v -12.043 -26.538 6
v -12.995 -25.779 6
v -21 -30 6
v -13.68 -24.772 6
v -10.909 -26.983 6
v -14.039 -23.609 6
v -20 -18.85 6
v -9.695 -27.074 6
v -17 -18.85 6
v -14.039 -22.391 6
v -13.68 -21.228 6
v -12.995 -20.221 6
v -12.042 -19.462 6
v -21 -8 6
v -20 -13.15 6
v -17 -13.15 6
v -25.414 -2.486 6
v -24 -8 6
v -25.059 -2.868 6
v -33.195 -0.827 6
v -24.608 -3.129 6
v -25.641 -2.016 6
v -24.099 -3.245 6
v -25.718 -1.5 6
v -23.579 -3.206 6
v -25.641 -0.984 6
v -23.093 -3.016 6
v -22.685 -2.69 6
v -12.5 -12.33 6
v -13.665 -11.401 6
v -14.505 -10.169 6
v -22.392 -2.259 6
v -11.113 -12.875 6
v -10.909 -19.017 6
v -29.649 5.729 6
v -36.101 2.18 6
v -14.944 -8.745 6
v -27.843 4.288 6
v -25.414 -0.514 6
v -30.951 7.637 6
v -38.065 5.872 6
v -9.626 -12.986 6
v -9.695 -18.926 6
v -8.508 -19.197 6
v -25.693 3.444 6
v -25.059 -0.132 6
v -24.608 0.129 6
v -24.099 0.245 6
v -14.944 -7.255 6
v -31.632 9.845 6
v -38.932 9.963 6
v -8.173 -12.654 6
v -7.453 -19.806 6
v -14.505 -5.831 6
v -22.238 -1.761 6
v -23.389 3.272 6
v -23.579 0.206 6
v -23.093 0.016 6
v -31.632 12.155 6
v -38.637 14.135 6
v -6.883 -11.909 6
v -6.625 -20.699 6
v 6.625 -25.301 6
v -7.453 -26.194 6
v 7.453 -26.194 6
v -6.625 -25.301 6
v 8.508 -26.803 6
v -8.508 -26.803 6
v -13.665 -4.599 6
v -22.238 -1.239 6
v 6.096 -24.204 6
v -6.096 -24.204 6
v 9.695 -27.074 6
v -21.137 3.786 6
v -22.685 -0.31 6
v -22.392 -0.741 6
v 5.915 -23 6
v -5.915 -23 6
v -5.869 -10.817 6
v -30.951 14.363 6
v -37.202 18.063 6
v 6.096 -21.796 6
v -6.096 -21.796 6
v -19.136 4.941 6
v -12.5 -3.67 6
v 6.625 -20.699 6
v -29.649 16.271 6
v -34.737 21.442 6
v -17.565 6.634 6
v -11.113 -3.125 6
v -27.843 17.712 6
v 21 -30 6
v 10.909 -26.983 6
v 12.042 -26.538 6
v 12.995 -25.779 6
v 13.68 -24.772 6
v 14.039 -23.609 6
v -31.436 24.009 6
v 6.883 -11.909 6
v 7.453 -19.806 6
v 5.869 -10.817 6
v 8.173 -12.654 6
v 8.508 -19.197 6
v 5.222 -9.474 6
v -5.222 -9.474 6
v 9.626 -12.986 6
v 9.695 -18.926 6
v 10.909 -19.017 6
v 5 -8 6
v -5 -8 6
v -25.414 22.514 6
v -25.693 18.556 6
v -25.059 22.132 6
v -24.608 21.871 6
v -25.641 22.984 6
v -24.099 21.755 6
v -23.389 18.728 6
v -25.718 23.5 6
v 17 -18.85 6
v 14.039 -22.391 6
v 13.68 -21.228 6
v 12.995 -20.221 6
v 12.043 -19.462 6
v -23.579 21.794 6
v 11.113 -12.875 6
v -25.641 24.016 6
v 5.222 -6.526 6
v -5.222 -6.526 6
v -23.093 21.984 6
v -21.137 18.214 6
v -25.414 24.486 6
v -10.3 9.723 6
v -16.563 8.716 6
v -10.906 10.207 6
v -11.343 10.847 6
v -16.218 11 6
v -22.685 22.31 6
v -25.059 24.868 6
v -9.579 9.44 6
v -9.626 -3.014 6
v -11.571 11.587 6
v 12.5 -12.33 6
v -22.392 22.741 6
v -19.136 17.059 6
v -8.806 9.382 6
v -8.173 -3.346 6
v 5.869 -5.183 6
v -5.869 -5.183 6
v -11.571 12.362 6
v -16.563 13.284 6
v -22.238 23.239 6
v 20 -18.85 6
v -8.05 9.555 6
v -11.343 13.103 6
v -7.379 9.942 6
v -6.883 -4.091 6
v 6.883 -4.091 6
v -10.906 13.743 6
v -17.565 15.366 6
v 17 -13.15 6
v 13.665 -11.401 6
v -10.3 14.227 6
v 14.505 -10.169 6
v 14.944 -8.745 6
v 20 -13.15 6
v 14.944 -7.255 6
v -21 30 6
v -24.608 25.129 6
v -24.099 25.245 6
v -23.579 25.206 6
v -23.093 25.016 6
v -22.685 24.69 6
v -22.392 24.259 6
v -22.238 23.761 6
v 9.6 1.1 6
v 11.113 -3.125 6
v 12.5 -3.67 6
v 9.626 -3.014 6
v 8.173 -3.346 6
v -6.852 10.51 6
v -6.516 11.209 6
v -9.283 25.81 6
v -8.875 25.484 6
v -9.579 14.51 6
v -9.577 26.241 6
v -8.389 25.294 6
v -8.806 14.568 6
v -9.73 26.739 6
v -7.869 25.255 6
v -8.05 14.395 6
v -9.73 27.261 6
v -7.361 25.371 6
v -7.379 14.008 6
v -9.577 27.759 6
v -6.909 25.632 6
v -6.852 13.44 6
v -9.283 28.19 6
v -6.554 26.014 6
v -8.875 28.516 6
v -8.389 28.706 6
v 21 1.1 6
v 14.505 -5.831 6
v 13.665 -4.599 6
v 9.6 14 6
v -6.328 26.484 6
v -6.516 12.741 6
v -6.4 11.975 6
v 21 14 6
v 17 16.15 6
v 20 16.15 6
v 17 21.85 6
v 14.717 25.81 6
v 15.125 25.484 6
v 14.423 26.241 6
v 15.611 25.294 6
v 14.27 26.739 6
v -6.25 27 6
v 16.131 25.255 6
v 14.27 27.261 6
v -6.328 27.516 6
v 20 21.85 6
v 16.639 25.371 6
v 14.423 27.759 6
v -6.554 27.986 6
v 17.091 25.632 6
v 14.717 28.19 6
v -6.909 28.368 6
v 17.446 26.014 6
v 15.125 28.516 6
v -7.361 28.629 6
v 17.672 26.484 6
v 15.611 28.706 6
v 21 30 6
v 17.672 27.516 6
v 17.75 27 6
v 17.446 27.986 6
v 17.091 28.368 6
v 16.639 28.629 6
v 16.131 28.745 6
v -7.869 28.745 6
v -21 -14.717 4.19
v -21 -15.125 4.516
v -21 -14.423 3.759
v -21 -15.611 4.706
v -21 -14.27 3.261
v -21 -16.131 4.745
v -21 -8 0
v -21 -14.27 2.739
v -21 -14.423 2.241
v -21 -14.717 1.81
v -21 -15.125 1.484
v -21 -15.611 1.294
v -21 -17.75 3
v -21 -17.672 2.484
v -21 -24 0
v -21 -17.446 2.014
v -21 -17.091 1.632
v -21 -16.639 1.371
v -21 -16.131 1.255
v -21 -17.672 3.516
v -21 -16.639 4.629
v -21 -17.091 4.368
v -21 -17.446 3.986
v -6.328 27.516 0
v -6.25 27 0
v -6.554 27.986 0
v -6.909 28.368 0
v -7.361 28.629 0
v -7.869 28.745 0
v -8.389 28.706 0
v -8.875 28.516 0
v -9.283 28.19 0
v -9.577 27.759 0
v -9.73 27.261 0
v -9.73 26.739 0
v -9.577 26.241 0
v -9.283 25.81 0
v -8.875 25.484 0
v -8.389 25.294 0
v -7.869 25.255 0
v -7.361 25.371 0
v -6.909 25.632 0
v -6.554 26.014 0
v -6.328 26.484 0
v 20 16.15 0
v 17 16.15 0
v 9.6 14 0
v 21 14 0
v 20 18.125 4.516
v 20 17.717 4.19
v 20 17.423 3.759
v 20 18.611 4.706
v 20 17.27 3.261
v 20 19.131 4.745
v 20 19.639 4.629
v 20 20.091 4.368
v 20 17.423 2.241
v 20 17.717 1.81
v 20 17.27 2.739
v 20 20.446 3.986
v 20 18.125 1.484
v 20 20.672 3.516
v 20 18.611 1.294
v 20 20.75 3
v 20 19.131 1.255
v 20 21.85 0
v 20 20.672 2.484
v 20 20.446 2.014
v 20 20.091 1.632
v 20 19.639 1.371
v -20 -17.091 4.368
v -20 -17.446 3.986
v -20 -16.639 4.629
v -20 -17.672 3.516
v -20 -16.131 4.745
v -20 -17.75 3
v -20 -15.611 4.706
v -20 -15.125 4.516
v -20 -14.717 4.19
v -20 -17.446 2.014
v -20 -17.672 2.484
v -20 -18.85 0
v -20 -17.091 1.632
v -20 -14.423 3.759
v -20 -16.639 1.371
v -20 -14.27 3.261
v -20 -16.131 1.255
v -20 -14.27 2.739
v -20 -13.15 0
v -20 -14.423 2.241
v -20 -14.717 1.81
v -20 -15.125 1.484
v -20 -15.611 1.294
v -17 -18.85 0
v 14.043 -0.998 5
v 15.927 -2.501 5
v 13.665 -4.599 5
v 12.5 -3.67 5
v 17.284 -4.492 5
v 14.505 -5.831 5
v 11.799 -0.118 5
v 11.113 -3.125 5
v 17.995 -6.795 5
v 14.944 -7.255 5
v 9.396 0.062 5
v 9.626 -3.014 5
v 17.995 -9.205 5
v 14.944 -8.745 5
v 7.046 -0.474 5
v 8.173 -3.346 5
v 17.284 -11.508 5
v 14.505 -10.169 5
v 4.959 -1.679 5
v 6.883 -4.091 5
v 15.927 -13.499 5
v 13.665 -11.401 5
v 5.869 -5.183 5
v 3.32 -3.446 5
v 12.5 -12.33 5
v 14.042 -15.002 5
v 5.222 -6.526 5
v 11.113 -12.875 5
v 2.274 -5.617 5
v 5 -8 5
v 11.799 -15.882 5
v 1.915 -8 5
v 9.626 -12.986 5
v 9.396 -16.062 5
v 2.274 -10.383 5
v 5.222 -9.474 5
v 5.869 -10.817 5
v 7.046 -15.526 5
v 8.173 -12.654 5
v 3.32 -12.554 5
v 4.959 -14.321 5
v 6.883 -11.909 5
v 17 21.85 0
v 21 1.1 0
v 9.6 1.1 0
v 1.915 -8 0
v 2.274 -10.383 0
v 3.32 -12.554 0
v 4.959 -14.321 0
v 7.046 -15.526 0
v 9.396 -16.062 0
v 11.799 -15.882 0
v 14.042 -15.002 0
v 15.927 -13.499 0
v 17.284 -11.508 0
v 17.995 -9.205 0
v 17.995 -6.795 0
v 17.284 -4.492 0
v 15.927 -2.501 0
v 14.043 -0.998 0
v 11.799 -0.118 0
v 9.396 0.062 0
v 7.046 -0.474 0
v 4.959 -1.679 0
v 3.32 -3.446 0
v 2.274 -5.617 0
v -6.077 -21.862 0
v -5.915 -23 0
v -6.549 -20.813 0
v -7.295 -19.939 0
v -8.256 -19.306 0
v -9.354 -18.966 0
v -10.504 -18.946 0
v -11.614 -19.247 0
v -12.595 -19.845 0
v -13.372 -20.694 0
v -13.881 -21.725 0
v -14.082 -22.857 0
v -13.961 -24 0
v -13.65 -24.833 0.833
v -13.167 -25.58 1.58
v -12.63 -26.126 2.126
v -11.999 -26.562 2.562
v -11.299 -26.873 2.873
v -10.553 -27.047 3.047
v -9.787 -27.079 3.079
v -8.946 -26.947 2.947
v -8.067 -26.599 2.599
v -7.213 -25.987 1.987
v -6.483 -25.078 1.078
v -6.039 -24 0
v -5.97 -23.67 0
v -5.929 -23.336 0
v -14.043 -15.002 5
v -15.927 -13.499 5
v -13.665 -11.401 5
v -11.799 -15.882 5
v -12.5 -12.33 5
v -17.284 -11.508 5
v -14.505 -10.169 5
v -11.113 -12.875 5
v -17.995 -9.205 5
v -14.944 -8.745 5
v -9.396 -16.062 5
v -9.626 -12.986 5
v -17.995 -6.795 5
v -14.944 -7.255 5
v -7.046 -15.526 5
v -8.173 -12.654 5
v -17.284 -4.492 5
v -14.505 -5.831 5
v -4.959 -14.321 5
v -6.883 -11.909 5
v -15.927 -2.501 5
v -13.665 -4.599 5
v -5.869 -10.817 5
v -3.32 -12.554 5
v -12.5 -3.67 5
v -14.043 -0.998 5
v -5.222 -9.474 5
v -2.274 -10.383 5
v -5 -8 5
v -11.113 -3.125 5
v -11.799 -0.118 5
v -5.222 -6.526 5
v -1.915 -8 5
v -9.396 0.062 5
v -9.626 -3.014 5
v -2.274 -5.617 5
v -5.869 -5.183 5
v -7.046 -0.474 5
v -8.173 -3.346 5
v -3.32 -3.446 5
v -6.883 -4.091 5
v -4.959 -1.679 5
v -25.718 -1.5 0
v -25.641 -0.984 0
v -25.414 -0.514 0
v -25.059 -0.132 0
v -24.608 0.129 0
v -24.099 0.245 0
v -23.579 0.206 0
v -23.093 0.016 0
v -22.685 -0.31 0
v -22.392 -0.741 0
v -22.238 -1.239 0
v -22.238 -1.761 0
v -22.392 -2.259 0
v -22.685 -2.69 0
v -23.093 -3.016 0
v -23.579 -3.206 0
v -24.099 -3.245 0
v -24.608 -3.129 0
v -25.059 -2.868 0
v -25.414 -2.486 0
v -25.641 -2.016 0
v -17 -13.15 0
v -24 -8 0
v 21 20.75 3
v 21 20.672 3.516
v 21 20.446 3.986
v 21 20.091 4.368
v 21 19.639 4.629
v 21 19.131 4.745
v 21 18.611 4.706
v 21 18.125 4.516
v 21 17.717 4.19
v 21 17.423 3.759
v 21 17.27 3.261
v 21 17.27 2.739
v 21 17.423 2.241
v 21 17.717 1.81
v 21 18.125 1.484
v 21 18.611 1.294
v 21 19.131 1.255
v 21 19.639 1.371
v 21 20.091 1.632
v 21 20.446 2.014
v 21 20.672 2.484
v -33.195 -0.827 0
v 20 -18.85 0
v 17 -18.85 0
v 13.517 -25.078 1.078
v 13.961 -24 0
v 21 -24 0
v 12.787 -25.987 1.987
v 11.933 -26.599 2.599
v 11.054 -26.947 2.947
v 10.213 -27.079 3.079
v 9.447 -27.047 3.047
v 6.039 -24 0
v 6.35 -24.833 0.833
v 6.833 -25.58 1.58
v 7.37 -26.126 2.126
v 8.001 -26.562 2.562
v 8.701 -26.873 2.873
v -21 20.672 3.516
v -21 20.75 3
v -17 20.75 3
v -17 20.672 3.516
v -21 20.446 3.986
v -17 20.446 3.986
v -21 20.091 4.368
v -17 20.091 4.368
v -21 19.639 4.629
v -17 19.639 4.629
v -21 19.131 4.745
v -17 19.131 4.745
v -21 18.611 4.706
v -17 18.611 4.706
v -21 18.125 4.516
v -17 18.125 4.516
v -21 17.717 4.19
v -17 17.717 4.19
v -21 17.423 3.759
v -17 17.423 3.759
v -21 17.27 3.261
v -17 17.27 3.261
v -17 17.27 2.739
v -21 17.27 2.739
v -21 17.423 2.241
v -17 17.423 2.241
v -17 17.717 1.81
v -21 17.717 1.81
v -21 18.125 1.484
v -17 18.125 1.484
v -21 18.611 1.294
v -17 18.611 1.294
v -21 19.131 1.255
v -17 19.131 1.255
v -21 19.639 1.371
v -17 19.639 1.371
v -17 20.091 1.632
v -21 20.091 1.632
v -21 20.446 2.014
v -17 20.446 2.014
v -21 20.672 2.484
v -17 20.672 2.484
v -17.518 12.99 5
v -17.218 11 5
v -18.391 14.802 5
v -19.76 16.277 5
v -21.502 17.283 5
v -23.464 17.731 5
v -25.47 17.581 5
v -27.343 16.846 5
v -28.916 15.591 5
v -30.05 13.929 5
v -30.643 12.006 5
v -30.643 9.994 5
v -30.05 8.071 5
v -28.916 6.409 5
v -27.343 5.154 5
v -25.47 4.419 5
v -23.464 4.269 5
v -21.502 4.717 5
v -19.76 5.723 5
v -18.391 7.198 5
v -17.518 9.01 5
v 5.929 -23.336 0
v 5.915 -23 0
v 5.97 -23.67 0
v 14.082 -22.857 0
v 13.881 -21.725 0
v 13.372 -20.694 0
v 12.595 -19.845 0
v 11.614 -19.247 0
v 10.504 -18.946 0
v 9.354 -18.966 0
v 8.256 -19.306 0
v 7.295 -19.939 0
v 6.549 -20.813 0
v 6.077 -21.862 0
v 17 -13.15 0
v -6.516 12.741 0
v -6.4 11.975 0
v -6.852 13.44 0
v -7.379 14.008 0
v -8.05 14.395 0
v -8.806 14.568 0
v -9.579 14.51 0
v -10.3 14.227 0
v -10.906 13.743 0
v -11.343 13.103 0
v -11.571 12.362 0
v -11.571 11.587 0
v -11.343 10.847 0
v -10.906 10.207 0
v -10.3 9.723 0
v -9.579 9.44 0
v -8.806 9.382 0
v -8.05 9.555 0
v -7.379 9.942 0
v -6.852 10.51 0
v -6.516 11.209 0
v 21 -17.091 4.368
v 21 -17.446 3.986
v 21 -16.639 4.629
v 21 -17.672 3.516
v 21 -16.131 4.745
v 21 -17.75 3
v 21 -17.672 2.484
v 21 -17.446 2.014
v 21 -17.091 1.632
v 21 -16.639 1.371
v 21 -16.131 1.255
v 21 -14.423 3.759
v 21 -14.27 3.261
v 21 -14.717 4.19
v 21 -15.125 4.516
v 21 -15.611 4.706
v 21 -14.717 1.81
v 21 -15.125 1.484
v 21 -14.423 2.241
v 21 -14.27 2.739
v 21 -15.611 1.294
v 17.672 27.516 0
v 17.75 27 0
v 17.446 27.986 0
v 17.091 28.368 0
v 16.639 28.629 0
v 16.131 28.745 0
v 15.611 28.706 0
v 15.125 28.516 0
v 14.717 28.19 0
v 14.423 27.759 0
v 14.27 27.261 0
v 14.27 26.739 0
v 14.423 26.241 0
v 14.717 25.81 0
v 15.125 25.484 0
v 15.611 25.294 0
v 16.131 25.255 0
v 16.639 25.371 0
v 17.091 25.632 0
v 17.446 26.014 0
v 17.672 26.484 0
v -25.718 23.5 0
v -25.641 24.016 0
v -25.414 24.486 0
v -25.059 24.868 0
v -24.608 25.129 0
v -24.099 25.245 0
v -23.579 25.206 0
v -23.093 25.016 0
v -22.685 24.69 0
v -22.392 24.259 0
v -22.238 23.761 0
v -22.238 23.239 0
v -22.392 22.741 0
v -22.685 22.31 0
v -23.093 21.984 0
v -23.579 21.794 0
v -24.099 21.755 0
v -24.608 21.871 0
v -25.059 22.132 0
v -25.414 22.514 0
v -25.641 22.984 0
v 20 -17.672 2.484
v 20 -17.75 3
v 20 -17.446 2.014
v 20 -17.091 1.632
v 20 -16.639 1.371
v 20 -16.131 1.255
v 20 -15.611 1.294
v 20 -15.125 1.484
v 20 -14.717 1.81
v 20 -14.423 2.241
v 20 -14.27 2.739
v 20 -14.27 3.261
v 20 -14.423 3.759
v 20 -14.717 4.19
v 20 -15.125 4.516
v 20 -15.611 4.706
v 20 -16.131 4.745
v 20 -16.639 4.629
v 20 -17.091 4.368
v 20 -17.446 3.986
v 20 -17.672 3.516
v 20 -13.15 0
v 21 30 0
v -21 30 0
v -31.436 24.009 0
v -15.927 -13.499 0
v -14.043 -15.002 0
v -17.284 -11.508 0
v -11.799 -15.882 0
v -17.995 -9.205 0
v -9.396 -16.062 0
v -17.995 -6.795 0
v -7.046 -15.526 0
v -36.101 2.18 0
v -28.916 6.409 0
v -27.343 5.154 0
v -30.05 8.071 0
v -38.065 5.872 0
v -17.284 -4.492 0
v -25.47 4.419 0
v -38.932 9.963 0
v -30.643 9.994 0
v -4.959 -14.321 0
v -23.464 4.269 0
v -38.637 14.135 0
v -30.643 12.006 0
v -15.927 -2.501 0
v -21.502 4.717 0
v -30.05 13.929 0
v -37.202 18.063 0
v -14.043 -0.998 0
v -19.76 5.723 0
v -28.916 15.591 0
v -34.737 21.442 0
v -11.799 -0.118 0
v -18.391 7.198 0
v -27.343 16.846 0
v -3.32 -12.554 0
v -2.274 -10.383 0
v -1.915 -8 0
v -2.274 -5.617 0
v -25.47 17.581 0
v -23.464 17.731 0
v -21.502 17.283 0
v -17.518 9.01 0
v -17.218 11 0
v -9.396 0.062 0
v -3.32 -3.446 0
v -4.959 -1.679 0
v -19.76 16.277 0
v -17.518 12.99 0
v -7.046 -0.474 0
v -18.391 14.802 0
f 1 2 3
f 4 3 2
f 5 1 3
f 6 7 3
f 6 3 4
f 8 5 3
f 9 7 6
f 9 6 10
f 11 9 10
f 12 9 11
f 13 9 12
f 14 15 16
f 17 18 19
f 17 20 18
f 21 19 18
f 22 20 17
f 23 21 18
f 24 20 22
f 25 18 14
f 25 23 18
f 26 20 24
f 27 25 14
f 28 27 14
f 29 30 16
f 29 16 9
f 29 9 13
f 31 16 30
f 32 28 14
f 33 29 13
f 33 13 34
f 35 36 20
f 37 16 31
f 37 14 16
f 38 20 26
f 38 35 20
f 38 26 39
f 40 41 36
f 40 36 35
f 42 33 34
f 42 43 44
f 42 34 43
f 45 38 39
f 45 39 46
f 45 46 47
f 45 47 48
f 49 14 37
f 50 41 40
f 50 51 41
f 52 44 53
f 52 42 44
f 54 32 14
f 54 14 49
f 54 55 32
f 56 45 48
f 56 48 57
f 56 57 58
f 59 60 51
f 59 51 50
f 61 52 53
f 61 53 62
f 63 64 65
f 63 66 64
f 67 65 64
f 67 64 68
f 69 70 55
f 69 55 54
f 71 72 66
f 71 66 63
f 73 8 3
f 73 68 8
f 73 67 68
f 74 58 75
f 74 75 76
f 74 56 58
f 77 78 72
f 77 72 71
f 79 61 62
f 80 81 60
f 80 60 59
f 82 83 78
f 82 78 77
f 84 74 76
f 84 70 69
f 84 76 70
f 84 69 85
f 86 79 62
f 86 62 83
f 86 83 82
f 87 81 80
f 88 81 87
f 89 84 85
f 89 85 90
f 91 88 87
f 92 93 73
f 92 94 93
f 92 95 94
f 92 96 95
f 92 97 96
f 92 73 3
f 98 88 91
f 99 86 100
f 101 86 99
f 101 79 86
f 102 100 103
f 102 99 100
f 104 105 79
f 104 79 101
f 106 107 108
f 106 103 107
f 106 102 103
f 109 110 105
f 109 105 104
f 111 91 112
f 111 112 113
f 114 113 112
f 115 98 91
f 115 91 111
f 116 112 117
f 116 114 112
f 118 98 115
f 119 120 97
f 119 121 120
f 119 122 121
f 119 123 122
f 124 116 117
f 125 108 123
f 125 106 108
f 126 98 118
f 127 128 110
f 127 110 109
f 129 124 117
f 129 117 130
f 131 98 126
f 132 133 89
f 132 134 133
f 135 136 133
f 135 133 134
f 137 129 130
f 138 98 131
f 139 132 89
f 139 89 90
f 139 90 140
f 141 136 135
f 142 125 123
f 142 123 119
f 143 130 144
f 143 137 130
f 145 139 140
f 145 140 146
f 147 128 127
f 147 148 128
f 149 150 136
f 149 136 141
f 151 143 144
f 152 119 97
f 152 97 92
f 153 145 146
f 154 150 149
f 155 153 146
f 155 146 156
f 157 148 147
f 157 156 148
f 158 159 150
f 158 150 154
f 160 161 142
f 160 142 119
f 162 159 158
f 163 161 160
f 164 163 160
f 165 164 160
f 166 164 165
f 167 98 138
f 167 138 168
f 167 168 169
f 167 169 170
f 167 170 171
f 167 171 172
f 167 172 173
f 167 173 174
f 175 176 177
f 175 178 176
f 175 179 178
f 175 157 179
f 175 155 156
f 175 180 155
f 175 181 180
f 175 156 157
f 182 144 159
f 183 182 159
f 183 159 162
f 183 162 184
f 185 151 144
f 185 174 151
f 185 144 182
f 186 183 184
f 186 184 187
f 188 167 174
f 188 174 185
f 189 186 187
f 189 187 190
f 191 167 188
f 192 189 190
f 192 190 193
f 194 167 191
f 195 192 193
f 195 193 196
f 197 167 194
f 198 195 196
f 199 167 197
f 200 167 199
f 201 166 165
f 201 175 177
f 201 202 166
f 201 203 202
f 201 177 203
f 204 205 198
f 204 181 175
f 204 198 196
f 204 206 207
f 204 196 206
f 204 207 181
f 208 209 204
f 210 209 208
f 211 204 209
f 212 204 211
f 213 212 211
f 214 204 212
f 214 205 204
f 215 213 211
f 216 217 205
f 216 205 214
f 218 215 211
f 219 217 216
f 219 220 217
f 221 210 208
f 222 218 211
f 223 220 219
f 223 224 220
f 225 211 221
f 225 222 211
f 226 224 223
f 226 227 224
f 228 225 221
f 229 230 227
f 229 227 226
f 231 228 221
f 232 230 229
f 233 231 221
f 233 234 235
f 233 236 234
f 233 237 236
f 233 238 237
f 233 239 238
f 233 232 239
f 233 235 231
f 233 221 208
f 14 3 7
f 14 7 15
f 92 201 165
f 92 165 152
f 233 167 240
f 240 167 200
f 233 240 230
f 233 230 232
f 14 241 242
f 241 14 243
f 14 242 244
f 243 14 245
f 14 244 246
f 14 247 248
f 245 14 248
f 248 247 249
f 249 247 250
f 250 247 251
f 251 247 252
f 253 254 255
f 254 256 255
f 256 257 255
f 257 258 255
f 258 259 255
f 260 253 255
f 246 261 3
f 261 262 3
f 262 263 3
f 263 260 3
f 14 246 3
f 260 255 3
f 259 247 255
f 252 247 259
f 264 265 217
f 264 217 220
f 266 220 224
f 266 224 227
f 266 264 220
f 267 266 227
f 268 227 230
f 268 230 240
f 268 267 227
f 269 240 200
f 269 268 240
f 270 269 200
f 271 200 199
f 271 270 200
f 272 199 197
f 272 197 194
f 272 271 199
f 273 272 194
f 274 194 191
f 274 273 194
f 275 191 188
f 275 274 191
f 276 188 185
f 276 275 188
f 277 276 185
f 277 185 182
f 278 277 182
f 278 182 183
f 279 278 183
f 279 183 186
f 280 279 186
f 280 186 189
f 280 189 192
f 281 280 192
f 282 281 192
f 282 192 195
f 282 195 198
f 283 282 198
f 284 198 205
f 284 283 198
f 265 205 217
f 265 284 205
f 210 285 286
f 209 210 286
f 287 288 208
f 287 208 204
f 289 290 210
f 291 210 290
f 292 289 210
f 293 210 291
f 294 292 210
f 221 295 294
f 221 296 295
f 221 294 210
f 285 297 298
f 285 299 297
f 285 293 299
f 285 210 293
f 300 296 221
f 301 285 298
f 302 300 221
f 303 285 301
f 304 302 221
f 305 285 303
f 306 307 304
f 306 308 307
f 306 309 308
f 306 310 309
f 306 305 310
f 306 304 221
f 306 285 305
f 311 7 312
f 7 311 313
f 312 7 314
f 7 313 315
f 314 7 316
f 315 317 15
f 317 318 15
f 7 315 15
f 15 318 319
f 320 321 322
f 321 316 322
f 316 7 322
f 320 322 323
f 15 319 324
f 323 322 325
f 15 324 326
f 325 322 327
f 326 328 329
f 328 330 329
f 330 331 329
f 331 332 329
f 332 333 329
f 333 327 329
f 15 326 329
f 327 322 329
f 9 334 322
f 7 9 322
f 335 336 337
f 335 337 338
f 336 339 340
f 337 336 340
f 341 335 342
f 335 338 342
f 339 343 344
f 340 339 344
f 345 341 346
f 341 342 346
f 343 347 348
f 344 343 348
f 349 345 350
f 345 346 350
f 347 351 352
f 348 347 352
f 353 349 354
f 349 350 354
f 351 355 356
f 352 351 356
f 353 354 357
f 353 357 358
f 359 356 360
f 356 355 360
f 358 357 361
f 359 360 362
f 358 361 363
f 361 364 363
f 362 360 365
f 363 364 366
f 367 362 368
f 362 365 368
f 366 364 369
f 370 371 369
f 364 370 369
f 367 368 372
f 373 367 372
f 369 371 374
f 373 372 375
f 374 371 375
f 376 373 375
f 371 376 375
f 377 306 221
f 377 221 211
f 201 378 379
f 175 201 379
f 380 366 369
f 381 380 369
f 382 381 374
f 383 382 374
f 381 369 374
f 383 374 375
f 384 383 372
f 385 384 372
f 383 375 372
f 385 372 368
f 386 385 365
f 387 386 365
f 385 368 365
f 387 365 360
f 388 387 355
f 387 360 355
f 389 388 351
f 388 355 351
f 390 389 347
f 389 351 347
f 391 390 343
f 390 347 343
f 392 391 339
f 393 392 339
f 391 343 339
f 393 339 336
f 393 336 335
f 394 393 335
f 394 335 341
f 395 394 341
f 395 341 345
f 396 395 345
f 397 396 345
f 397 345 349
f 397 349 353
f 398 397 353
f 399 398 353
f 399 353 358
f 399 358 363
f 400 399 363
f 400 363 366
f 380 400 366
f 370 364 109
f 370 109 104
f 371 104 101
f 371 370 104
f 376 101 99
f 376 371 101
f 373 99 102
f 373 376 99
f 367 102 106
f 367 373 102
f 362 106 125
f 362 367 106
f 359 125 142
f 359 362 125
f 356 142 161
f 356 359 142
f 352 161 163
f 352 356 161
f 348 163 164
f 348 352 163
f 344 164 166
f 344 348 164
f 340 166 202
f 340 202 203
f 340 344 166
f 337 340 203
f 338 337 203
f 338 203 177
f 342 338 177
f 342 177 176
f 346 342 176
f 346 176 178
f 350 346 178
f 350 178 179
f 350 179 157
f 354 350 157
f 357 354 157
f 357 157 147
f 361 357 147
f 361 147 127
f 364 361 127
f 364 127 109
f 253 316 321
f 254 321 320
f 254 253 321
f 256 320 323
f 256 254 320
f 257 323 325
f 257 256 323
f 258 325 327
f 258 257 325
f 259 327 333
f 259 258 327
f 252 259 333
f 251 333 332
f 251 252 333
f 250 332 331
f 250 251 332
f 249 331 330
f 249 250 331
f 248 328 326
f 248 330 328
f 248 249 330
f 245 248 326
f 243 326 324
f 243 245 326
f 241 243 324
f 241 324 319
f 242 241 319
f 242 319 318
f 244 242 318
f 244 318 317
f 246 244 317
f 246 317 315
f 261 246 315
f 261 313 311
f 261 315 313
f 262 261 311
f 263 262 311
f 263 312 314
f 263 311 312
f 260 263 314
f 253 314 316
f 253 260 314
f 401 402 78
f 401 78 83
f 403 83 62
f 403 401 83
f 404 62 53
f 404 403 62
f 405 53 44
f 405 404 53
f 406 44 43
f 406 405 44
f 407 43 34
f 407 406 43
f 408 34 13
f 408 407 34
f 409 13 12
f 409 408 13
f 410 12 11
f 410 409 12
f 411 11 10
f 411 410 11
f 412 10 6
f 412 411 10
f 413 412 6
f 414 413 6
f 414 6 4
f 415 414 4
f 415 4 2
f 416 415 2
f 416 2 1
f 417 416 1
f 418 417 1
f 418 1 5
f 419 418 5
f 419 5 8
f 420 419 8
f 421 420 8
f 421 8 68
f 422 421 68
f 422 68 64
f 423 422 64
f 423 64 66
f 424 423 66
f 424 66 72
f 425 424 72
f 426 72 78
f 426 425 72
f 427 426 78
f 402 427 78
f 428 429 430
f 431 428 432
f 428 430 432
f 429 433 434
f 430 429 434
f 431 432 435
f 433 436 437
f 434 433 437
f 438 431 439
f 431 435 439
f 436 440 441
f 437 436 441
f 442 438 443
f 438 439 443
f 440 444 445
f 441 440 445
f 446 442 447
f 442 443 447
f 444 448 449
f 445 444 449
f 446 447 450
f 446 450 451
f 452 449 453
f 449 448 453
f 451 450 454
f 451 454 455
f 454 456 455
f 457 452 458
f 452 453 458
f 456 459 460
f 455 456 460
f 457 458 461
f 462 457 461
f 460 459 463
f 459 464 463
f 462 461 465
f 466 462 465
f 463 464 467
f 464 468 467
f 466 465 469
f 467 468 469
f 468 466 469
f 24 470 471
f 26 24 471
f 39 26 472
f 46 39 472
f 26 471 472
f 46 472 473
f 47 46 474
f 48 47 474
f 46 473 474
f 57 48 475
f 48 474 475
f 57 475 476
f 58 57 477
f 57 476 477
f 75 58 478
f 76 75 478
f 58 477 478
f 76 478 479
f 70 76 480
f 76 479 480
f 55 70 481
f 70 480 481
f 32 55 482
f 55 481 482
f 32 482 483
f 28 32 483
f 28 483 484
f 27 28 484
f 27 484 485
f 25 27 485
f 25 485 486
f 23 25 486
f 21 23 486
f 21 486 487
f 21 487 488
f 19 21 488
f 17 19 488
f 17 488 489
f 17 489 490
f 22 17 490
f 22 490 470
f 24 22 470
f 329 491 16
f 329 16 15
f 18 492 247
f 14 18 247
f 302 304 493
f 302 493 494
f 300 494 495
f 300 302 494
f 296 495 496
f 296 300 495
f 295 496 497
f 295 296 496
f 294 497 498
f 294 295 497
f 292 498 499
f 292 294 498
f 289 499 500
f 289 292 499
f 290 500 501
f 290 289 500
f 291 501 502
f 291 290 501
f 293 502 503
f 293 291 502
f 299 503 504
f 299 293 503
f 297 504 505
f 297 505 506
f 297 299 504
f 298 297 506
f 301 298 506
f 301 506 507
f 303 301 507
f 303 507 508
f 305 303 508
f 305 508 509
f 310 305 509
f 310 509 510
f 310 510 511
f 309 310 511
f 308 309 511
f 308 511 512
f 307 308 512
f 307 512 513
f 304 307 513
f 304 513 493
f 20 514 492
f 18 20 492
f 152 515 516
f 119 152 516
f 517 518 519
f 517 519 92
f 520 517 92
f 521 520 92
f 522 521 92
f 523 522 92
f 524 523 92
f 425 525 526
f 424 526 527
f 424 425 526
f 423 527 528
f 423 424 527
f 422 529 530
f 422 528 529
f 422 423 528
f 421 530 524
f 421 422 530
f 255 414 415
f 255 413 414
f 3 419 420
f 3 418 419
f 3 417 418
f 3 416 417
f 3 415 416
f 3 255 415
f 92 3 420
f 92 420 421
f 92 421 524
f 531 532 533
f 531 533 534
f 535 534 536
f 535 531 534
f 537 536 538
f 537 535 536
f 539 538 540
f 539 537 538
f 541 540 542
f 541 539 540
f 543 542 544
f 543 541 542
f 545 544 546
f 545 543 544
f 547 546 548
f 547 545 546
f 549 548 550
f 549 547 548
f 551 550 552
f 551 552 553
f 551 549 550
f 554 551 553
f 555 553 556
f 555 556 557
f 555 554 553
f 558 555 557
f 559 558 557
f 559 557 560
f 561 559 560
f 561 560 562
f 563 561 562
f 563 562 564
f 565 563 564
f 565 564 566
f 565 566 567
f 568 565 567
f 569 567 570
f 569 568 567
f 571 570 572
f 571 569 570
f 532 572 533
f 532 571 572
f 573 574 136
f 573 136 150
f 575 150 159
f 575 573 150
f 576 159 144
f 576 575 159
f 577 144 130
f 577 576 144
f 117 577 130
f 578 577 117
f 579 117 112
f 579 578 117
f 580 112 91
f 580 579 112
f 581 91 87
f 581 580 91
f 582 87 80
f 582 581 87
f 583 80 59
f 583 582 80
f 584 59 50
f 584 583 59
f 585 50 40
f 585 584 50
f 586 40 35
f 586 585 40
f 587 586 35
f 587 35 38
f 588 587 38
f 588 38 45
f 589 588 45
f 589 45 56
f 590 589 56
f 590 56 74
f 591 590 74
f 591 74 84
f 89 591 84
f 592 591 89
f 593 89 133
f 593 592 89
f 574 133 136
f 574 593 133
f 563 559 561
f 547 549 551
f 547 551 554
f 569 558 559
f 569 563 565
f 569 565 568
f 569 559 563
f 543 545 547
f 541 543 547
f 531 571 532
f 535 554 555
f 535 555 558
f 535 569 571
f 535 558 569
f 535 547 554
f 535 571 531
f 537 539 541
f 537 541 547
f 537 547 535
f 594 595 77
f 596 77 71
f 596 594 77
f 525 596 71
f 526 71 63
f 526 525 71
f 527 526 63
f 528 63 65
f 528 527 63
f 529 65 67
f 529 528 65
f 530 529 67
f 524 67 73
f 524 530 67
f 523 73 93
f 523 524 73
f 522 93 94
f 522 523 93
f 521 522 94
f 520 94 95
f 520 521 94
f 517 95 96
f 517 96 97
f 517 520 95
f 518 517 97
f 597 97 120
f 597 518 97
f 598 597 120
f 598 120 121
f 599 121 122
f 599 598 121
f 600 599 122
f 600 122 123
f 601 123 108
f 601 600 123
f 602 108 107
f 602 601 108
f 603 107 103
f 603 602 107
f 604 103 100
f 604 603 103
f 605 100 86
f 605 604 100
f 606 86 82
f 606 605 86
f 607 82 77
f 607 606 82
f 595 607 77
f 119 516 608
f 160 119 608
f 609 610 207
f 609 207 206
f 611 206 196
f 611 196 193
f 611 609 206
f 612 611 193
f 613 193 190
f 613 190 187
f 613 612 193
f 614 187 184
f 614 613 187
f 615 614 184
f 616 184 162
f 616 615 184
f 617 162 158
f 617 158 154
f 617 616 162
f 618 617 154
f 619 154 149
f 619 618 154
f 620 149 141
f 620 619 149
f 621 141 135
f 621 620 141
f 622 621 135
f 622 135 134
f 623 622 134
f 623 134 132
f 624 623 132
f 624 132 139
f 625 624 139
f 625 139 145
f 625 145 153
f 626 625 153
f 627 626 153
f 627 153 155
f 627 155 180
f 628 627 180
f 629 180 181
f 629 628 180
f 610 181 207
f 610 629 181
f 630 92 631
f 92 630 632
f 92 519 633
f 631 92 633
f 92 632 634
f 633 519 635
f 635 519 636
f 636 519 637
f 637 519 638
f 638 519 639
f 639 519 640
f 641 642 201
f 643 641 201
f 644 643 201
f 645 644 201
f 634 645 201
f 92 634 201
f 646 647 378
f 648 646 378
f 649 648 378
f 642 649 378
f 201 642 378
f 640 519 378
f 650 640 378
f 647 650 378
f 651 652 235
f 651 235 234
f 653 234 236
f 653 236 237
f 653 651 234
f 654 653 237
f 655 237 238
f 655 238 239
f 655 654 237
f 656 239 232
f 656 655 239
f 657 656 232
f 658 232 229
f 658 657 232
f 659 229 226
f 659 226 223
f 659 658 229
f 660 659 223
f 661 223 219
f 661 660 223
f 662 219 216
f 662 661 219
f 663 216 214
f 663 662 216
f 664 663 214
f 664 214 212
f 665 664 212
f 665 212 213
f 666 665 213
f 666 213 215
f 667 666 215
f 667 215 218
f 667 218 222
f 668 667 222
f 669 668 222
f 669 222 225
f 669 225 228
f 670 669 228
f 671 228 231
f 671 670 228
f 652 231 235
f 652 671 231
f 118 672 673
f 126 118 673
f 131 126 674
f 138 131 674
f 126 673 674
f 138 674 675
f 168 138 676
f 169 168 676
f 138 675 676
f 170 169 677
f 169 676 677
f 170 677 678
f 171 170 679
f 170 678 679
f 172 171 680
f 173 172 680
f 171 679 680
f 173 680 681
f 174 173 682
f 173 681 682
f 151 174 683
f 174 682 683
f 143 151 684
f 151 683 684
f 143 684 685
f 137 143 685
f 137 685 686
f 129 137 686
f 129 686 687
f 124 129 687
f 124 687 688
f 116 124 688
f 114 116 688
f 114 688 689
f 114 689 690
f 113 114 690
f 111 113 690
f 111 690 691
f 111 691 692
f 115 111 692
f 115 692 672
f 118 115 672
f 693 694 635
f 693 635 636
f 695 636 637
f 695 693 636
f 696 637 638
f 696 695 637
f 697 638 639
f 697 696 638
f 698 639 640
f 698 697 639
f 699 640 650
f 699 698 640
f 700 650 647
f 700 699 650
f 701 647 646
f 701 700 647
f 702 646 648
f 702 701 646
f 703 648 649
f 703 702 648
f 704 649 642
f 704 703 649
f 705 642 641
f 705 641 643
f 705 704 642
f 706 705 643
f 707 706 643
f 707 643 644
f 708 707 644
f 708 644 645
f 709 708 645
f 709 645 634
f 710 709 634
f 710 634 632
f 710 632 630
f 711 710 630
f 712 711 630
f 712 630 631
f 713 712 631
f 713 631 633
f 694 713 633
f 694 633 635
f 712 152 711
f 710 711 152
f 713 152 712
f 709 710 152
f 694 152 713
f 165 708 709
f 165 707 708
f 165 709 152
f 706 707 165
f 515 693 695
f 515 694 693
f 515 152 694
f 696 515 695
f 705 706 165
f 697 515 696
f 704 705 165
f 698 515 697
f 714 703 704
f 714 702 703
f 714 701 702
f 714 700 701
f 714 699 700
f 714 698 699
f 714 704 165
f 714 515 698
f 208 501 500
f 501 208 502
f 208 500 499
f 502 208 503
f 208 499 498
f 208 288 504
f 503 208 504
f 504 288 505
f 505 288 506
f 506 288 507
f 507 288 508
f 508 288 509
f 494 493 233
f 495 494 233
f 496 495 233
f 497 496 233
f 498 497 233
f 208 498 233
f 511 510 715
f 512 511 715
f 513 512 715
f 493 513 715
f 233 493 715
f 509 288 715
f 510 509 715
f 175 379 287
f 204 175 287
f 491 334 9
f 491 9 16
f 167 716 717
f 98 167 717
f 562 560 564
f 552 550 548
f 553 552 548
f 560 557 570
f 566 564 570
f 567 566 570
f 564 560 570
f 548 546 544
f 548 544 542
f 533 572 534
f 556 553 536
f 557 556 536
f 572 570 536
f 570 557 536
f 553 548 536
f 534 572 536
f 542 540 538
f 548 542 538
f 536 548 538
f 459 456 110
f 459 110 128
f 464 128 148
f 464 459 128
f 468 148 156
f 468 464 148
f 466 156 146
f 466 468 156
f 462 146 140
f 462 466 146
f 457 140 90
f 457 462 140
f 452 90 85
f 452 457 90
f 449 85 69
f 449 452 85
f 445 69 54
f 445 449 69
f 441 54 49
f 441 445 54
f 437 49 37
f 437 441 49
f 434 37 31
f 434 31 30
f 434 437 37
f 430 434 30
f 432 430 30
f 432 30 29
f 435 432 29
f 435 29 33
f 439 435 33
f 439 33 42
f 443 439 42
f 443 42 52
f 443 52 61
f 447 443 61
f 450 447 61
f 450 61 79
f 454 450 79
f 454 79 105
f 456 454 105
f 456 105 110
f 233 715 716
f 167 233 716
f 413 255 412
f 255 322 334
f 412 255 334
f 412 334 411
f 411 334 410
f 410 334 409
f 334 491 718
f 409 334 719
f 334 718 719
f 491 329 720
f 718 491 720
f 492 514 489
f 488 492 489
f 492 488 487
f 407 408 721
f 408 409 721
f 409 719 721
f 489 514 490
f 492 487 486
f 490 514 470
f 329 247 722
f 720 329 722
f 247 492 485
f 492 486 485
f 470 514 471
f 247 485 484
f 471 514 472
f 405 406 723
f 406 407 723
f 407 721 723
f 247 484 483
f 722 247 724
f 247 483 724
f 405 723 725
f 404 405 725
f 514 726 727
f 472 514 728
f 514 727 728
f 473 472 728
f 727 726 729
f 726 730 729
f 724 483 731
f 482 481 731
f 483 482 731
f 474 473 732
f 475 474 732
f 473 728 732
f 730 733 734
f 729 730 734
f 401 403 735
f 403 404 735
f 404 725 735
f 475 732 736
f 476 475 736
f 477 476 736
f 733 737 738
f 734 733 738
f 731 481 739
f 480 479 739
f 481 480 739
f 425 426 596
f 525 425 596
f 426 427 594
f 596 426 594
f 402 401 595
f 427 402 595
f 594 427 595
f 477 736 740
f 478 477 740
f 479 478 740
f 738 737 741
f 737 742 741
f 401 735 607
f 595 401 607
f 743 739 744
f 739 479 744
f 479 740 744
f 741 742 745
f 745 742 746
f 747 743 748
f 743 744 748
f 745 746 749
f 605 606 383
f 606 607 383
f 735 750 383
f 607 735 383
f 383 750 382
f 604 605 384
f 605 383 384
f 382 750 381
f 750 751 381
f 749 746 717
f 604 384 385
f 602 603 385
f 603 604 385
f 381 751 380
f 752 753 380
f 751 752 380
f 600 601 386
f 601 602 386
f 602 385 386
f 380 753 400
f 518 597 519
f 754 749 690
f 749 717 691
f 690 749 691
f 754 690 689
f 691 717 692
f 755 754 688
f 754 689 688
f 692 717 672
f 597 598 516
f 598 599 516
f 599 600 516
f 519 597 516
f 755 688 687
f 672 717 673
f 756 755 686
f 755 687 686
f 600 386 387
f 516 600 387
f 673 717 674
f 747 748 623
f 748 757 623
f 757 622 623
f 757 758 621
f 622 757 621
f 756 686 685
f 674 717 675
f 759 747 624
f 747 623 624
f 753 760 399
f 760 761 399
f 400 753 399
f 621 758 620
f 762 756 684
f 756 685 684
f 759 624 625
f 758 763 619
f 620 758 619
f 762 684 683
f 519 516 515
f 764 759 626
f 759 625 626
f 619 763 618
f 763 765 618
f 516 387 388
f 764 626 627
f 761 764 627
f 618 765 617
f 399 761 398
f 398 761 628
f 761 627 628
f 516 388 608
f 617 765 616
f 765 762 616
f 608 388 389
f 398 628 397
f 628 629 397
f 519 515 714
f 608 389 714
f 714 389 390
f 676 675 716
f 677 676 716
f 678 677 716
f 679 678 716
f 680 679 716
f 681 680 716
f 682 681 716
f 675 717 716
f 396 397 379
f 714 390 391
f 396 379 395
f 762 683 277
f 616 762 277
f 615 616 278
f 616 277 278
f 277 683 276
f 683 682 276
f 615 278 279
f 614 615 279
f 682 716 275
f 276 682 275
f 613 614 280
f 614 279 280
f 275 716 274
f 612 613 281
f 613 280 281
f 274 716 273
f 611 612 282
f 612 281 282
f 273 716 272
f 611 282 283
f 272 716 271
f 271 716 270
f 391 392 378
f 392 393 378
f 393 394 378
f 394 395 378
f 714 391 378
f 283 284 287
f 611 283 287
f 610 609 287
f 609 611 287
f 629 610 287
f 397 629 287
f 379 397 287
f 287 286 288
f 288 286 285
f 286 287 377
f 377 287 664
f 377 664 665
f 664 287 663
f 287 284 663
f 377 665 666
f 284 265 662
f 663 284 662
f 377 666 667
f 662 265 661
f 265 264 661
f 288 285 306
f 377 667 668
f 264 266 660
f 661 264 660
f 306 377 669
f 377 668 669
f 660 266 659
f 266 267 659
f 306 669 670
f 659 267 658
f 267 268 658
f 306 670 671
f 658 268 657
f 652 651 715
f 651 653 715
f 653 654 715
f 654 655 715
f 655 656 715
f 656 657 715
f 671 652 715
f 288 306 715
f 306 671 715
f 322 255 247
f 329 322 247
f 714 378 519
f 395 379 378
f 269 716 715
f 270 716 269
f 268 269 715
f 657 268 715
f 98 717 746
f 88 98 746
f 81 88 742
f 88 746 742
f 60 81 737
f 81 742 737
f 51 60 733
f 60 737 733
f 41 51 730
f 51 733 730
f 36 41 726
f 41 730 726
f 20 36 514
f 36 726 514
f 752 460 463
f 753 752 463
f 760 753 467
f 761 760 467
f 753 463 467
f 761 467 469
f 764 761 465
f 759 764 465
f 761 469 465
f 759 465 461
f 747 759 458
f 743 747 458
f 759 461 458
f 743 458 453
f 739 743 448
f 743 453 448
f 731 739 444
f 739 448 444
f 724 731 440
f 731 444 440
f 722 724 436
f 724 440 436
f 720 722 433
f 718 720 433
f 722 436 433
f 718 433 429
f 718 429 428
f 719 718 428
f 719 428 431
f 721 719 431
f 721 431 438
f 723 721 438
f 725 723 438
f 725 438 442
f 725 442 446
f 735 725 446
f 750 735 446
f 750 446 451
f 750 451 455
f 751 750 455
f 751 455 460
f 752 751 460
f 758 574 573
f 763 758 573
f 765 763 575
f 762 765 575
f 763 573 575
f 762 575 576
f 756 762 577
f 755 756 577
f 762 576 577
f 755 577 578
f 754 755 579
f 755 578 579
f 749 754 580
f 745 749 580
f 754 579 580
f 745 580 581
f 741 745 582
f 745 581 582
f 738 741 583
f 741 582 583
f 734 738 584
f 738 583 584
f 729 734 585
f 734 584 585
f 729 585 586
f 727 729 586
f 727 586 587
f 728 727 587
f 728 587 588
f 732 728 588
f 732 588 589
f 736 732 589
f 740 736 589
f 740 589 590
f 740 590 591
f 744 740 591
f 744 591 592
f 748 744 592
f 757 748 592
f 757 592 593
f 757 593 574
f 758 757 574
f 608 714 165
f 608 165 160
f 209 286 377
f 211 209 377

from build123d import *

# Parameters (mm, degrees)
SKETCH1_R           = 4.085
SKETCH1_R_2         = 5
SKETCH1_R_3         = 2.6
SKETCH1_R_4         = 2.5
SKETCH1_R_5         = 1.75
BOSS_EXTRUDE1_DEPTH = 6
CUT_EXTRUDE1_START  = -1
SKETCH2_R           = 8.085
CUT_EXTRUDE1_DEPTH  = 49.543181614
SKETCH5_R           = 6.75
CUT_EXTRUDE4_DEPTH  = 50.543181614
CHAMFER1_SIZE       = 6
SKETCH6_W           = 11.4
SKETCH6_H           = 12.9
CUT_EXTRUDE5_DEPTH  = 15
SKETCH7_R           = 1.75
SKETCH7_W           = 3
SKETCH7_H           = 5.7
CUT_EXTRUDE6_DEPTH  = 10
CUT_EXTRUDE7_START  = -42
SKETCH8_R           = 1.75
CUT_EXTRUDE7_DEPTH  = 4
CUT_EXTRUDE8_START  = -4
SKETCH8_2_R         = 1.75
CUT_EXTRUDE8_DEPTH  = 4
CHAMFER2_SIZE       = 1


with BuildPart() as part:
    # Sketch1 → Boss-Extrude1 (new body)
    with BuildSketch(Plane.XY):
        with BuildLine():
            Line((-21, -30), (21, -30))
            Line((21, -30), (21, 30))
            Line((21, 30), (-21, 30))
            Line((-21, 30), (-31.4362913, 24.008797289))
            ThreePointArc((-31.4362913, 24.008797289), (-38.93081829, 12.059456115), (-33.194824566, -0.826701779))
            Line((-33.194824566, -0.826701779), (-24, -8))
            Line((-24, -8), (-21, -8))
            Line((-21, -8), (-21, -30))
        make_face()
        with Locations((-10, -23)):
            Circle(SKETCH1_R, mode=Mode.SUBTRACT)
        with Locations((-10, -8)):
            Circle(SKETCH1_R_2, mode=Mode.SUBTRACT)
        with Locations(Location((10, -8, 0), (0, 0, 180))):
            Circle(SKETCH1_R_2, mode=Mode.SUBTRACT)
        with Locations(Location((10, -23, 0), (0, 0, 180))):
            Circle(SKETCH1_R, mode=Mode.SUBTRACT)
        with Locations((-9, 11.974984355)):
            Circle(SKETCH1_R_3, mode=Mode.SUBTRACT)
        with Locations((-23.968279978, 11)):
            Circle(SKETCH1_R_4, mode=Mode.SUBTRACT)
        with Locations((16, 27)):
            Circle(SKETCH1_R_5, mode=Mode.SUBTRACT)
        with Locations((-8, 27)):
            Circle(SKETCH1_R_5, mode=Mode.SUBTRACT)
    extrude(amount=BOSS_EXTRUDE1_DEPTH)

    # Sketch2 → Cut-Extrude1 (cut, through all)
    with BuildSketch(Plane.XY.offset(6).offset(CUT_EXTRUDE1_START)):
        with Locations((-10, -8)):
            Circle(SKETCH2_R)
        with Locations(Location((10, -8, 0), (0, 0, 180))):
            Circle(SKETCH2_R)
    extrude(amount=-CUT_EXTRUDE1_DEPTH, mode=Mode.SUBTRACT)

    # Sketch5 → Cut-Extrude4 (cut, through all)
    with BuildSketch(Plane.XY.offset(6)):
        with Locations((-23.968279978, 11)):
            Circle(SKETCH5_R)
    extrude(amount=-CUT_EXTRUDE4_DEPTH, mode=Mode.SUBTRACT)

    # Chamfer1
    # the kernel refuses this chamfer: 6 mm, written as the material it takes off along each edge
    with BuildSketch(Plane(origin=(-36.430097928, -30, 0), x_dir=(0, 0.9996219169112969, -0.027495876610586382), z_dir=(1, 0, 0))) as chamfer1_piece_1:
        Polygon((CHAMFER1_SIZE * 0.999621916911, CHAMFER1_SIZE * 0.0274958766106), (-CHAMFER1_SIZE * 0.0274958766106, CHAMFER1_SIZE * 0.999621916911), (0, 0), align=None)
    extrude(amount=72.860195856, mode=Mode.SUBTRACT)

    # Sketch6 → Cut-Extrude5 (cut)
    with BuildSketch(Plane(origin=(0, 0, 0), x_dir=(-1, 0, 0), z_dir=(0, 0, -1))):
        with Locations((-15.3, 7.55)):
            Rectangle(SKETCH6_W, SKETCH6_H)
    extrude(amount=-CUT_EXTRUDE5_DEPTH, mode=Mode.SUBTRACT)

    # Sketch7 → Cut-Extrude6 (cut)
    with BuildSketch(Plane(origin=(0, 0, 0), x_dir=(-1, 0, 0), z_dir=(0, 0, -1))):
        with Locations((23.968279978, 23.5)):
            Circle(SKETCH7_R)
        with Locations((23.968279978, -1.5)):
            Circle(SKETCH7_R)
        with Locations((-18.5, -16)):
            Rectangle(SKETCH7_W, SKETCH7_H)
        with Locations((18.5, -16)):
            Rectangle(SKETCH7_W, SKETCH7_H)
        with Locations((-18.5, 19)):
            Rectangle(SKETCH7_W, SKETCH7_H)
    extrude(amount=-CUT_EXTRUDE6_DEPTH, mode=Mode.SUBTRACT)

    # Sketch8 → Cut-Extrude7 (cut)
    with BuildSketch(Plane(origin=(21, 0, 0), x_dir=(0, 0, -1), z_dir=(1, 0, 0)).offset(CUT_EXTRUDE7_START)):
        with Locations(Location((-3, -16, 0), (0, 0, 270))):
            Circle(SKETCH8_R)
        with Locations(Location((-3, 19, 0), (0, 0, 90))):
            Circle(SKETCH8_R)
    extrude(amount=CUT_EXTRUDE7_DEPTH, mode=Mode.SUBTRACT)

    # Sketch8<2> → Cut-Extrude8 (cut)
    with BuildSketch(Plane(origin=(21, 0, 0), x_dir=(0, 0, -1), z_dir=(1, 0, 0)).offset(CUT_EXTRUDE8_START)):
        with Locations(Location((-3, -16, 0), (0, 0, 270))):
            Circle(SKETCH8_2_R)
        with Locations(Location((-3, 19, 0), (0, 0, 90))):
            Circle(SKETCH8_2_R)
    extrude(amount=CUT_EXTRUDE8_DEPTH, mode=Mode.SUBTRACT)

    # Chamfer2
    chamfer2_edges = [part.edges().sort_by_distance(p)[0] for p in [
        (-30.718279978, 11, 6),
    ]]
    chamfer(chamfer2_edges, length=CHAMFER2_SIZE)


solid = part.part
